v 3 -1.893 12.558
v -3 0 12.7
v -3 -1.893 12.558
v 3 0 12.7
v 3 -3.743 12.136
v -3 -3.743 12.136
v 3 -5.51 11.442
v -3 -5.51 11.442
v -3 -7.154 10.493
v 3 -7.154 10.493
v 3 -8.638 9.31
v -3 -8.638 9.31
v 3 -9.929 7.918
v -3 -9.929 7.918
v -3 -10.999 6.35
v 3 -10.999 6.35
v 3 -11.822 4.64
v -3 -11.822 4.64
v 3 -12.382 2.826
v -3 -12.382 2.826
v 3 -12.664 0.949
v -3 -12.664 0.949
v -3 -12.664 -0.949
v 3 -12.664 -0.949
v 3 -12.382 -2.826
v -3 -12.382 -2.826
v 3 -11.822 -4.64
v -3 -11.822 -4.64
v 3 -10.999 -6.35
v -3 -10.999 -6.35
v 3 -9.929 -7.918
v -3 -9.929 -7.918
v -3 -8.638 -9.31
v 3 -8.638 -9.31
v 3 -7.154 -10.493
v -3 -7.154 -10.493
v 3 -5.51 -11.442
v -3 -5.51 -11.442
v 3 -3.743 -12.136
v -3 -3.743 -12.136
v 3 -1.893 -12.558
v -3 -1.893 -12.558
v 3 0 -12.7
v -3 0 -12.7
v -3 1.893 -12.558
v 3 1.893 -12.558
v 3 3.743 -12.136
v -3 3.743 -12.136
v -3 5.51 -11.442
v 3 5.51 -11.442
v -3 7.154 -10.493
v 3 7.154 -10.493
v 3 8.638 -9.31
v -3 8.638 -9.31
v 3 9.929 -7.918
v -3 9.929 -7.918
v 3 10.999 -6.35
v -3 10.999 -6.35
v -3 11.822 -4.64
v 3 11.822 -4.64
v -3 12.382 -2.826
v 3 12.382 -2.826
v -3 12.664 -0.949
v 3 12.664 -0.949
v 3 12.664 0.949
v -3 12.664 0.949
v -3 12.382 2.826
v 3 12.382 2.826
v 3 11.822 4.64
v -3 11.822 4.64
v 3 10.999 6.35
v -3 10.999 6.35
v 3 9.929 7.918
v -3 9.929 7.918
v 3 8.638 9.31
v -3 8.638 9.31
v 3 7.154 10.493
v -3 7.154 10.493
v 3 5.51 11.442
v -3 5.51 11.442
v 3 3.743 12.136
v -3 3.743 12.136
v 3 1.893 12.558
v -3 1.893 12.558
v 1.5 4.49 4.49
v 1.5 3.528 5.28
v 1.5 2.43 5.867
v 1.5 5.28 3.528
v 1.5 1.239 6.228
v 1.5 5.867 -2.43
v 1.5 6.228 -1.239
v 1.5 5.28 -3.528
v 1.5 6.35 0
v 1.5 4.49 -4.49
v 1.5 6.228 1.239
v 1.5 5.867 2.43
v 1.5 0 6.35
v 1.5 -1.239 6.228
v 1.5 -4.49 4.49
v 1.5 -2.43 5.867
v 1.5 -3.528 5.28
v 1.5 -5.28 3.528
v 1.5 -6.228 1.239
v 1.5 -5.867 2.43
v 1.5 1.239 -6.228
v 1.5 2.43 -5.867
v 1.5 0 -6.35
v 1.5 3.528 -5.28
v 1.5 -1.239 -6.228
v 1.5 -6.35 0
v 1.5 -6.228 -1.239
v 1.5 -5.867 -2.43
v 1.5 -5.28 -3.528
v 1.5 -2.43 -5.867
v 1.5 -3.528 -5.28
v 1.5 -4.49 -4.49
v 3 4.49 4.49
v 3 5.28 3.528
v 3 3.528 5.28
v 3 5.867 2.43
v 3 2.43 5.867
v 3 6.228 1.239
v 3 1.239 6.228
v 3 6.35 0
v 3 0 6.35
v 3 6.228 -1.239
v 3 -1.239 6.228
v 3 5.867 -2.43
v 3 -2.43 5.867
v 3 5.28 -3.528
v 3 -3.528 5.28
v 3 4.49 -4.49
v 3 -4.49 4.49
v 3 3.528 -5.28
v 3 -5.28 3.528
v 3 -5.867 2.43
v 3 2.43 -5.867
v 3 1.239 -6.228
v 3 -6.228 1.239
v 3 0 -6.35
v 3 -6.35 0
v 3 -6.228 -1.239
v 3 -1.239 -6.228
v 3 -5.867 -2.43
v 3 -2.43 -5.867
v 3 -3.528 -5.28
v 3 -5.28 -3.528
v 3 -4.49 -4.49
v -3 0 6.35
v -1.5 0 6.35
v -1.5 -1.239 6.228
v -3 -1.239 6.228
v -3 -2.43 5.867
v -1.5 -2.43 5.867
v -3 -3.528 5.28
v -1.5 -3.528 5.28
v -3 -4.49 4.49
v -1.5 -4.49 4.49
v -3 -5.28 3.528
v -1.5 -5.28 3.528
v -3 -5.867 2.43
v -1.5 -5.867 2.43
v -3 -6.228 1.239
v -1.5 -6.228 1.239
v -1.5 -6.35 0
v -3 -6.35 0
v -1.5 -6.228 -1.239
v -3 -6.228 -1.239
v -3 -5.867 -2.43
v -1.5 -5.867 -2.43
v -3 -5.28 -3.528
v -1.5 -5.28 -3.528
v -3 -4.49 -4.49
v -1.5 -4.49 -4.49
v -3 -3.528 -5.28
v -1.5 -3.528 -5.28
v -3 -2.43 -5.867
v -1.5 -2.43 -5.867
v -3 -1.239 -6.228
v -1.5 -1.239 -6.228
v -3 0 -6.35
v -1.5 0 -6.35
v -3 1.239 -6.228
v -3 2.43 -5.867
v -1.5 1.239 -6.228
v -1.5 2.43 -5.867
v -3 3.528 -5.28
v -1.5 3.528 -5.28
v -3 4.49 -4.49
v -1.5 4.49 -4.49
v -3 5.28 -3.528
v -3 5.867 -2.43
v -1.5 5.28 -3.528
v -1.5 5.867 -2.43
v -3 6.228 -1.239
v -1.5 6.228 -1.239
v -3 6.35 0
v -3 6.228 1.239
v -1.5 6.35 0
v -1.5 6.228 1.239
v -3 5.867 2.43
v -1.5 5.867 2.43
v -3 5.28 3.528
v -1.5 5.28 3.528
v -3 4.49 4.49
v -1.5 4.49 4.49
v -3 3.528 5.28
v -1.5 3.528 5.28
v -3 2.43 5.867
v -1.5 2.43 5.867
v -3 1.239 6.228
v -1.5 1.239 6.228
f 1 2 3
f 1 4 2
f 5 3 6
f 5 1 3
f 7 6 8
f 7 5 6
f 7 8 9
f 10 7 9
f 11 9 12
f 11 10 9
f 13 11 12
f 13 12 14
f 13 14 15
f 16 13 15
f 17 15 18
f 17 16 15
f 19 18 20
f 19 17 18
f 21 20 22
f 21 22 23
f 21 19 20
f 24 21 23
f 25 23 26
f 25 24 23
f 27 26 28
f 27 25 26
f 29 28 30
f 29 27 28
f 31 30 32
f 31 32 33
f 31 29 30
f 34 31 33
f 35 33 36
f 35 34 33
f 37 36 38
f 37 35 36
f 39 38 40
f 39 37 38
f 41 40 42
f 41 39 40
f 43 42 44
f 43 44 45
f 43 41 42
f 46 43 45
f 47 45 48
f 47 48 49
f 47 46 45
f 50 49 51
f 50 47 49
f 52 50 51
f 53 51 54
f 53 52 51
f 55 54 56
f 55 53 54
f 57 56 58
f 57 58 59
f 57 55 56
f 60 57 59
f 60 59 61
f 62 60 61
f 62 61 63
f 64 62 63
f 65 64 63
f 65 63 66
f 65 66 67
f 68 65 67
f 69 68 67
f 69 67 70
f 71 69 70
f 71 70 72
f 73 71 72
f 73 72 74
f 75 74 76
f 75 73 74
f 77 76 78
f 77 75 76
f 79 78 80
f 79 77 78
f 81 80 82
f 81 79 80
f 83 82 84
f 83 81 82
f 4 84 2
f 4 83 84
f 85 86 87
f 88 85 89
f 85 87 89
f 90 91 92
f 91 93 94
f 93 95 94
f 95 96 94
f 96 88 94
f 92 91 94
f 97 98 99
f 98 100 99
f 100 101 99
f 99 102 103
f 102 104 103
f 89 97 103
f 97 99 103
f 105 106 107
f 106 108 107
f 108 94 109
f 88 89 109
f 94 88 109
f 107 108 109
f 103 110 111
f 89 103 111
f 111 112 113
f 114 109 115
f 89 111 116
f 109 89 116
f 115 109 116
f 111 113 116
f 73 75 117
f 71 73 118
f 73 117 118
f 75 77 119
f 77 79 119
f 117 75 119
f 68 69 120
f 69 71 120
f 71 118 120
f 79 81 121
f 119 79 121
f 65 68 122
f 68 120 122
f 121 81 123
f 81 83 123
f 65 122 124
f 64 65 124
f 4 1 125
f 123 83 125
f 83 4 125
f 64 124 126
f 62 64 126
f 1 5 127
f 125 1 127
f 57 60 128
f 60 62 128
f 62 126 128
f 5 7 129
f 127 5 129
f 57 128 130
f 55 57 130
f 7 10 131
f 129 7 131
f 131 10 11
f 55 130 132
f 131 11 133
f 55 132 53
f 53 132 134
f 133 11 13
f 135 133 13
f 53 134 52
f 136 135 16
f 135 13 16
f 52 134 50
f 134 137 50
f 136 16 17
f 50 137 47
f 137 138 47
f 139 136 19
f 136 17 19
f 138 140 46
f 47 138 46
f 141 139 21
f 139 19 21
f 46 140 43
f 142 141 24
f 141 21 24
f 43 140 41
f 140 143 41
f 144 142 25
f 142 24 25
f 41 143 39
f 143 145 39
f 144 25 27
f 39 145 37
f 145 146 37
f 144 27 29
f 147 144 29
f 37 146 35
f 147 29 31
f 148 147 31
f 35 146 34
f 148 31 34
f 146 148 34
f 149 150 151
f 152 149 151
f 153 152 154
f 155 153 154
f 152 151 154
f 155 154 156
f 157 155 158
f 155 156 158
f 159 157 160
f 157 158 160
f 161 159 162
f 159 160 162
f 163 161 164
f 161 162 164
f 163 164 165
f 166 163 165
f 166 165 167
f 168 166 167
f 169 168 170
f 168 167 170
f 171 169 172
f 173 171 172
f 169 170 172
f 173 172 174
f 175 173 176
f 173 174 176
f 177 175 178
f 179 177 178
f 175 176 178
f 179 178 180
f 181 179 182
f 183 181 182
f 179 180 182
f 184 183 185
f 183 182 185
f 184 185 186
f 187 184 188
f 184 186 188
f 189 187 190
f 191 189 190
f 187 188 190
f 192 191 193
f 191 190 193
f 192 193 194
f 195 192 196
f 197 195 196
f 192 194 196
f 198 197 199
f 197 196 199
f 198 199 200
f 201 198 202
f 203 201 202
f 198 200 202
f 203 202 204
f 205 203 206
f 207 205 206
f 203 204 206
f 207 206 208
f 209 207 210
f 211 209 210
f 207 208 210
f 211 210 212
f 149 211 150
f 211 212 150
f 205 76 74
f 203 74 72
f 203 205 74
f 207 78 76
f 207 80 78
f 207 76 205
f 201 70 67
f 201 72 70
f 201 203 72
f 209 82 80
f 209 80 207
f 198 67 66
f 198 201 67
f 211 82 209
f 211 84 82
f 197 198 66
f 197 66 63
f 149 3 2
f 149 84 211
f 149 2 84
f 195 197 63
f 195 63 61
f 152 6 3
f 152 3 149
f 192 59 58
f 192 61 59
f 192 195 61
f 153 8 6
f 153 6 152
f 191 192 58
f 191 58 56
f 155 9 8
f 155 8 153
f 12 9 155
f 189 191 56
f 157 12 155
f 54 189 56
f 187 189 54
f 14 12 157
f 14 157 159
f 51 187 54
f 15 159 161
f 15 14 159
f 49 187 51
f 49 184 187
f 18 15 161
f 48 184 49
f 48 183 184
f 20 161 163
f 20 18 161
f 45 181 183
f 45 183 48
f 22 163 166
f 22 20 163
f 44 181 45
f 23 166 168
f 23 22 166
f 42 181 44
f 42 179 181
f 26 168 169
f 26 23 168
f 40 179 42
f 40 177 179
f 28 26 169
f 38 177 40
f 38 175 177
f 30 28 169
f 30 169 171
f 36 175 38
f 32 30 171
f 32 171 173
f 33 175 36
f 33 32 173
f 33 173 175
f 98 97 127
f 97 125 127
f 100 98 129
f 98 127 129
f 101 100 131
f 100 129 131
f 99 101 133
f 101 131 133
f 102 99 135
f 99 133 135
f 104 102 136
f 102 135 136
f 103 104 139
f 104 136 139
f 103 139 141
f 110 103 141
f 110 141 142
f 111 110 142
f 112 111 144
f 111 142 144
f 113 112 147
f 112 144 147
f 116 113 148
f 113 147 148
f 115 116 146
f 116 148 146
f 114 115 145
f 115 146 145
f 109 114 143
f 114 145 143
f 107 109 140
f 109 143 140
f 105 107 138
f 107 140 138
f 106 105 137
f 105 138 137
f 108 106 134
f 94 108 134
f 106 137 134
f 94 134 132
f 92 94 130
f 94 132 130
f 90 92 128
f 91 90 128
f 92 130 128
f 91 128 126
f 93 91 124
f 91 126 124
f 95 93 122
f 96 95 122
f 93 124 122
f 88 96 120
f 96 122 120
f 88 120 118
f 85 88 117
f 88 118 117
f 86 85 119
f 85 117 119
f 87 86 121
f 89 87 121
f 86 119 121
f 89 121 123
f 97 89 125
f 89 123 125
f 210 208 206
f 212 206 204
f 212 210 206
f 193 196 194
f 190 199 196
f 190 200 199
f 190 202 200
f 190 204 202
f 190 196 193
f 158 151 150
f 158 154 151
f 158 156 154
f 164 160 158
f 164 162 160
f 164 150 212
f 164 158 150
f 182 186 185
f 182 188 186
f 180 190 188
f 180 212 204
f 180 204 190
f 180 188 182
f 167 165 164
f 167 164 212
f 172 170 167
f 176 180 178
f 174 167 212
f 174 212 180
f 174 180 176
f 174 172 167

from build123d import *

# Parameters (mm, degrees)
SKETCH_1_W = 3
SKETCH_1_H = 6.35
SKETCH_4_W = 6
SKETCH_4_H = 6.35


with BuildPart() as part:
    # 草图1 → 旋转2 (revolve)
    with BuildSketch(Plane.XY, mode=Mode.PRIVATE) as revolve_2_sk:
        with Locations((0, 3.175)):
            Rectangle(SKETCH_1_W, SKETCH_1_H)
    revolve(revolve_2_sk.sketch.rotate(Axis((-1.5, 0, 0), (1, 0, 0)), 90), axis=Axis((-1.5, 0, 0), (1, 0, 0)))  # turned: the seam where the file's is

    # 草图4 → 旋转3 (revolve)
    with BuildSketch(Plane.XY, mode=Mode.PRIVATE) as revolve_3_sk:
        with Locations((0, 9.525)):
            Rectangle(SKETCH_4_W, SKETCH_4_H)
    revolve(revolve_3_sk.sketch.rotate(Axis((-1.614212419, 0, 0), (1, 0, 0)), 90), axis=Axis((-1.614212419, 0, 0), (1, 0, 0)))  # turned: the seam where the file's is


solid = part.part
